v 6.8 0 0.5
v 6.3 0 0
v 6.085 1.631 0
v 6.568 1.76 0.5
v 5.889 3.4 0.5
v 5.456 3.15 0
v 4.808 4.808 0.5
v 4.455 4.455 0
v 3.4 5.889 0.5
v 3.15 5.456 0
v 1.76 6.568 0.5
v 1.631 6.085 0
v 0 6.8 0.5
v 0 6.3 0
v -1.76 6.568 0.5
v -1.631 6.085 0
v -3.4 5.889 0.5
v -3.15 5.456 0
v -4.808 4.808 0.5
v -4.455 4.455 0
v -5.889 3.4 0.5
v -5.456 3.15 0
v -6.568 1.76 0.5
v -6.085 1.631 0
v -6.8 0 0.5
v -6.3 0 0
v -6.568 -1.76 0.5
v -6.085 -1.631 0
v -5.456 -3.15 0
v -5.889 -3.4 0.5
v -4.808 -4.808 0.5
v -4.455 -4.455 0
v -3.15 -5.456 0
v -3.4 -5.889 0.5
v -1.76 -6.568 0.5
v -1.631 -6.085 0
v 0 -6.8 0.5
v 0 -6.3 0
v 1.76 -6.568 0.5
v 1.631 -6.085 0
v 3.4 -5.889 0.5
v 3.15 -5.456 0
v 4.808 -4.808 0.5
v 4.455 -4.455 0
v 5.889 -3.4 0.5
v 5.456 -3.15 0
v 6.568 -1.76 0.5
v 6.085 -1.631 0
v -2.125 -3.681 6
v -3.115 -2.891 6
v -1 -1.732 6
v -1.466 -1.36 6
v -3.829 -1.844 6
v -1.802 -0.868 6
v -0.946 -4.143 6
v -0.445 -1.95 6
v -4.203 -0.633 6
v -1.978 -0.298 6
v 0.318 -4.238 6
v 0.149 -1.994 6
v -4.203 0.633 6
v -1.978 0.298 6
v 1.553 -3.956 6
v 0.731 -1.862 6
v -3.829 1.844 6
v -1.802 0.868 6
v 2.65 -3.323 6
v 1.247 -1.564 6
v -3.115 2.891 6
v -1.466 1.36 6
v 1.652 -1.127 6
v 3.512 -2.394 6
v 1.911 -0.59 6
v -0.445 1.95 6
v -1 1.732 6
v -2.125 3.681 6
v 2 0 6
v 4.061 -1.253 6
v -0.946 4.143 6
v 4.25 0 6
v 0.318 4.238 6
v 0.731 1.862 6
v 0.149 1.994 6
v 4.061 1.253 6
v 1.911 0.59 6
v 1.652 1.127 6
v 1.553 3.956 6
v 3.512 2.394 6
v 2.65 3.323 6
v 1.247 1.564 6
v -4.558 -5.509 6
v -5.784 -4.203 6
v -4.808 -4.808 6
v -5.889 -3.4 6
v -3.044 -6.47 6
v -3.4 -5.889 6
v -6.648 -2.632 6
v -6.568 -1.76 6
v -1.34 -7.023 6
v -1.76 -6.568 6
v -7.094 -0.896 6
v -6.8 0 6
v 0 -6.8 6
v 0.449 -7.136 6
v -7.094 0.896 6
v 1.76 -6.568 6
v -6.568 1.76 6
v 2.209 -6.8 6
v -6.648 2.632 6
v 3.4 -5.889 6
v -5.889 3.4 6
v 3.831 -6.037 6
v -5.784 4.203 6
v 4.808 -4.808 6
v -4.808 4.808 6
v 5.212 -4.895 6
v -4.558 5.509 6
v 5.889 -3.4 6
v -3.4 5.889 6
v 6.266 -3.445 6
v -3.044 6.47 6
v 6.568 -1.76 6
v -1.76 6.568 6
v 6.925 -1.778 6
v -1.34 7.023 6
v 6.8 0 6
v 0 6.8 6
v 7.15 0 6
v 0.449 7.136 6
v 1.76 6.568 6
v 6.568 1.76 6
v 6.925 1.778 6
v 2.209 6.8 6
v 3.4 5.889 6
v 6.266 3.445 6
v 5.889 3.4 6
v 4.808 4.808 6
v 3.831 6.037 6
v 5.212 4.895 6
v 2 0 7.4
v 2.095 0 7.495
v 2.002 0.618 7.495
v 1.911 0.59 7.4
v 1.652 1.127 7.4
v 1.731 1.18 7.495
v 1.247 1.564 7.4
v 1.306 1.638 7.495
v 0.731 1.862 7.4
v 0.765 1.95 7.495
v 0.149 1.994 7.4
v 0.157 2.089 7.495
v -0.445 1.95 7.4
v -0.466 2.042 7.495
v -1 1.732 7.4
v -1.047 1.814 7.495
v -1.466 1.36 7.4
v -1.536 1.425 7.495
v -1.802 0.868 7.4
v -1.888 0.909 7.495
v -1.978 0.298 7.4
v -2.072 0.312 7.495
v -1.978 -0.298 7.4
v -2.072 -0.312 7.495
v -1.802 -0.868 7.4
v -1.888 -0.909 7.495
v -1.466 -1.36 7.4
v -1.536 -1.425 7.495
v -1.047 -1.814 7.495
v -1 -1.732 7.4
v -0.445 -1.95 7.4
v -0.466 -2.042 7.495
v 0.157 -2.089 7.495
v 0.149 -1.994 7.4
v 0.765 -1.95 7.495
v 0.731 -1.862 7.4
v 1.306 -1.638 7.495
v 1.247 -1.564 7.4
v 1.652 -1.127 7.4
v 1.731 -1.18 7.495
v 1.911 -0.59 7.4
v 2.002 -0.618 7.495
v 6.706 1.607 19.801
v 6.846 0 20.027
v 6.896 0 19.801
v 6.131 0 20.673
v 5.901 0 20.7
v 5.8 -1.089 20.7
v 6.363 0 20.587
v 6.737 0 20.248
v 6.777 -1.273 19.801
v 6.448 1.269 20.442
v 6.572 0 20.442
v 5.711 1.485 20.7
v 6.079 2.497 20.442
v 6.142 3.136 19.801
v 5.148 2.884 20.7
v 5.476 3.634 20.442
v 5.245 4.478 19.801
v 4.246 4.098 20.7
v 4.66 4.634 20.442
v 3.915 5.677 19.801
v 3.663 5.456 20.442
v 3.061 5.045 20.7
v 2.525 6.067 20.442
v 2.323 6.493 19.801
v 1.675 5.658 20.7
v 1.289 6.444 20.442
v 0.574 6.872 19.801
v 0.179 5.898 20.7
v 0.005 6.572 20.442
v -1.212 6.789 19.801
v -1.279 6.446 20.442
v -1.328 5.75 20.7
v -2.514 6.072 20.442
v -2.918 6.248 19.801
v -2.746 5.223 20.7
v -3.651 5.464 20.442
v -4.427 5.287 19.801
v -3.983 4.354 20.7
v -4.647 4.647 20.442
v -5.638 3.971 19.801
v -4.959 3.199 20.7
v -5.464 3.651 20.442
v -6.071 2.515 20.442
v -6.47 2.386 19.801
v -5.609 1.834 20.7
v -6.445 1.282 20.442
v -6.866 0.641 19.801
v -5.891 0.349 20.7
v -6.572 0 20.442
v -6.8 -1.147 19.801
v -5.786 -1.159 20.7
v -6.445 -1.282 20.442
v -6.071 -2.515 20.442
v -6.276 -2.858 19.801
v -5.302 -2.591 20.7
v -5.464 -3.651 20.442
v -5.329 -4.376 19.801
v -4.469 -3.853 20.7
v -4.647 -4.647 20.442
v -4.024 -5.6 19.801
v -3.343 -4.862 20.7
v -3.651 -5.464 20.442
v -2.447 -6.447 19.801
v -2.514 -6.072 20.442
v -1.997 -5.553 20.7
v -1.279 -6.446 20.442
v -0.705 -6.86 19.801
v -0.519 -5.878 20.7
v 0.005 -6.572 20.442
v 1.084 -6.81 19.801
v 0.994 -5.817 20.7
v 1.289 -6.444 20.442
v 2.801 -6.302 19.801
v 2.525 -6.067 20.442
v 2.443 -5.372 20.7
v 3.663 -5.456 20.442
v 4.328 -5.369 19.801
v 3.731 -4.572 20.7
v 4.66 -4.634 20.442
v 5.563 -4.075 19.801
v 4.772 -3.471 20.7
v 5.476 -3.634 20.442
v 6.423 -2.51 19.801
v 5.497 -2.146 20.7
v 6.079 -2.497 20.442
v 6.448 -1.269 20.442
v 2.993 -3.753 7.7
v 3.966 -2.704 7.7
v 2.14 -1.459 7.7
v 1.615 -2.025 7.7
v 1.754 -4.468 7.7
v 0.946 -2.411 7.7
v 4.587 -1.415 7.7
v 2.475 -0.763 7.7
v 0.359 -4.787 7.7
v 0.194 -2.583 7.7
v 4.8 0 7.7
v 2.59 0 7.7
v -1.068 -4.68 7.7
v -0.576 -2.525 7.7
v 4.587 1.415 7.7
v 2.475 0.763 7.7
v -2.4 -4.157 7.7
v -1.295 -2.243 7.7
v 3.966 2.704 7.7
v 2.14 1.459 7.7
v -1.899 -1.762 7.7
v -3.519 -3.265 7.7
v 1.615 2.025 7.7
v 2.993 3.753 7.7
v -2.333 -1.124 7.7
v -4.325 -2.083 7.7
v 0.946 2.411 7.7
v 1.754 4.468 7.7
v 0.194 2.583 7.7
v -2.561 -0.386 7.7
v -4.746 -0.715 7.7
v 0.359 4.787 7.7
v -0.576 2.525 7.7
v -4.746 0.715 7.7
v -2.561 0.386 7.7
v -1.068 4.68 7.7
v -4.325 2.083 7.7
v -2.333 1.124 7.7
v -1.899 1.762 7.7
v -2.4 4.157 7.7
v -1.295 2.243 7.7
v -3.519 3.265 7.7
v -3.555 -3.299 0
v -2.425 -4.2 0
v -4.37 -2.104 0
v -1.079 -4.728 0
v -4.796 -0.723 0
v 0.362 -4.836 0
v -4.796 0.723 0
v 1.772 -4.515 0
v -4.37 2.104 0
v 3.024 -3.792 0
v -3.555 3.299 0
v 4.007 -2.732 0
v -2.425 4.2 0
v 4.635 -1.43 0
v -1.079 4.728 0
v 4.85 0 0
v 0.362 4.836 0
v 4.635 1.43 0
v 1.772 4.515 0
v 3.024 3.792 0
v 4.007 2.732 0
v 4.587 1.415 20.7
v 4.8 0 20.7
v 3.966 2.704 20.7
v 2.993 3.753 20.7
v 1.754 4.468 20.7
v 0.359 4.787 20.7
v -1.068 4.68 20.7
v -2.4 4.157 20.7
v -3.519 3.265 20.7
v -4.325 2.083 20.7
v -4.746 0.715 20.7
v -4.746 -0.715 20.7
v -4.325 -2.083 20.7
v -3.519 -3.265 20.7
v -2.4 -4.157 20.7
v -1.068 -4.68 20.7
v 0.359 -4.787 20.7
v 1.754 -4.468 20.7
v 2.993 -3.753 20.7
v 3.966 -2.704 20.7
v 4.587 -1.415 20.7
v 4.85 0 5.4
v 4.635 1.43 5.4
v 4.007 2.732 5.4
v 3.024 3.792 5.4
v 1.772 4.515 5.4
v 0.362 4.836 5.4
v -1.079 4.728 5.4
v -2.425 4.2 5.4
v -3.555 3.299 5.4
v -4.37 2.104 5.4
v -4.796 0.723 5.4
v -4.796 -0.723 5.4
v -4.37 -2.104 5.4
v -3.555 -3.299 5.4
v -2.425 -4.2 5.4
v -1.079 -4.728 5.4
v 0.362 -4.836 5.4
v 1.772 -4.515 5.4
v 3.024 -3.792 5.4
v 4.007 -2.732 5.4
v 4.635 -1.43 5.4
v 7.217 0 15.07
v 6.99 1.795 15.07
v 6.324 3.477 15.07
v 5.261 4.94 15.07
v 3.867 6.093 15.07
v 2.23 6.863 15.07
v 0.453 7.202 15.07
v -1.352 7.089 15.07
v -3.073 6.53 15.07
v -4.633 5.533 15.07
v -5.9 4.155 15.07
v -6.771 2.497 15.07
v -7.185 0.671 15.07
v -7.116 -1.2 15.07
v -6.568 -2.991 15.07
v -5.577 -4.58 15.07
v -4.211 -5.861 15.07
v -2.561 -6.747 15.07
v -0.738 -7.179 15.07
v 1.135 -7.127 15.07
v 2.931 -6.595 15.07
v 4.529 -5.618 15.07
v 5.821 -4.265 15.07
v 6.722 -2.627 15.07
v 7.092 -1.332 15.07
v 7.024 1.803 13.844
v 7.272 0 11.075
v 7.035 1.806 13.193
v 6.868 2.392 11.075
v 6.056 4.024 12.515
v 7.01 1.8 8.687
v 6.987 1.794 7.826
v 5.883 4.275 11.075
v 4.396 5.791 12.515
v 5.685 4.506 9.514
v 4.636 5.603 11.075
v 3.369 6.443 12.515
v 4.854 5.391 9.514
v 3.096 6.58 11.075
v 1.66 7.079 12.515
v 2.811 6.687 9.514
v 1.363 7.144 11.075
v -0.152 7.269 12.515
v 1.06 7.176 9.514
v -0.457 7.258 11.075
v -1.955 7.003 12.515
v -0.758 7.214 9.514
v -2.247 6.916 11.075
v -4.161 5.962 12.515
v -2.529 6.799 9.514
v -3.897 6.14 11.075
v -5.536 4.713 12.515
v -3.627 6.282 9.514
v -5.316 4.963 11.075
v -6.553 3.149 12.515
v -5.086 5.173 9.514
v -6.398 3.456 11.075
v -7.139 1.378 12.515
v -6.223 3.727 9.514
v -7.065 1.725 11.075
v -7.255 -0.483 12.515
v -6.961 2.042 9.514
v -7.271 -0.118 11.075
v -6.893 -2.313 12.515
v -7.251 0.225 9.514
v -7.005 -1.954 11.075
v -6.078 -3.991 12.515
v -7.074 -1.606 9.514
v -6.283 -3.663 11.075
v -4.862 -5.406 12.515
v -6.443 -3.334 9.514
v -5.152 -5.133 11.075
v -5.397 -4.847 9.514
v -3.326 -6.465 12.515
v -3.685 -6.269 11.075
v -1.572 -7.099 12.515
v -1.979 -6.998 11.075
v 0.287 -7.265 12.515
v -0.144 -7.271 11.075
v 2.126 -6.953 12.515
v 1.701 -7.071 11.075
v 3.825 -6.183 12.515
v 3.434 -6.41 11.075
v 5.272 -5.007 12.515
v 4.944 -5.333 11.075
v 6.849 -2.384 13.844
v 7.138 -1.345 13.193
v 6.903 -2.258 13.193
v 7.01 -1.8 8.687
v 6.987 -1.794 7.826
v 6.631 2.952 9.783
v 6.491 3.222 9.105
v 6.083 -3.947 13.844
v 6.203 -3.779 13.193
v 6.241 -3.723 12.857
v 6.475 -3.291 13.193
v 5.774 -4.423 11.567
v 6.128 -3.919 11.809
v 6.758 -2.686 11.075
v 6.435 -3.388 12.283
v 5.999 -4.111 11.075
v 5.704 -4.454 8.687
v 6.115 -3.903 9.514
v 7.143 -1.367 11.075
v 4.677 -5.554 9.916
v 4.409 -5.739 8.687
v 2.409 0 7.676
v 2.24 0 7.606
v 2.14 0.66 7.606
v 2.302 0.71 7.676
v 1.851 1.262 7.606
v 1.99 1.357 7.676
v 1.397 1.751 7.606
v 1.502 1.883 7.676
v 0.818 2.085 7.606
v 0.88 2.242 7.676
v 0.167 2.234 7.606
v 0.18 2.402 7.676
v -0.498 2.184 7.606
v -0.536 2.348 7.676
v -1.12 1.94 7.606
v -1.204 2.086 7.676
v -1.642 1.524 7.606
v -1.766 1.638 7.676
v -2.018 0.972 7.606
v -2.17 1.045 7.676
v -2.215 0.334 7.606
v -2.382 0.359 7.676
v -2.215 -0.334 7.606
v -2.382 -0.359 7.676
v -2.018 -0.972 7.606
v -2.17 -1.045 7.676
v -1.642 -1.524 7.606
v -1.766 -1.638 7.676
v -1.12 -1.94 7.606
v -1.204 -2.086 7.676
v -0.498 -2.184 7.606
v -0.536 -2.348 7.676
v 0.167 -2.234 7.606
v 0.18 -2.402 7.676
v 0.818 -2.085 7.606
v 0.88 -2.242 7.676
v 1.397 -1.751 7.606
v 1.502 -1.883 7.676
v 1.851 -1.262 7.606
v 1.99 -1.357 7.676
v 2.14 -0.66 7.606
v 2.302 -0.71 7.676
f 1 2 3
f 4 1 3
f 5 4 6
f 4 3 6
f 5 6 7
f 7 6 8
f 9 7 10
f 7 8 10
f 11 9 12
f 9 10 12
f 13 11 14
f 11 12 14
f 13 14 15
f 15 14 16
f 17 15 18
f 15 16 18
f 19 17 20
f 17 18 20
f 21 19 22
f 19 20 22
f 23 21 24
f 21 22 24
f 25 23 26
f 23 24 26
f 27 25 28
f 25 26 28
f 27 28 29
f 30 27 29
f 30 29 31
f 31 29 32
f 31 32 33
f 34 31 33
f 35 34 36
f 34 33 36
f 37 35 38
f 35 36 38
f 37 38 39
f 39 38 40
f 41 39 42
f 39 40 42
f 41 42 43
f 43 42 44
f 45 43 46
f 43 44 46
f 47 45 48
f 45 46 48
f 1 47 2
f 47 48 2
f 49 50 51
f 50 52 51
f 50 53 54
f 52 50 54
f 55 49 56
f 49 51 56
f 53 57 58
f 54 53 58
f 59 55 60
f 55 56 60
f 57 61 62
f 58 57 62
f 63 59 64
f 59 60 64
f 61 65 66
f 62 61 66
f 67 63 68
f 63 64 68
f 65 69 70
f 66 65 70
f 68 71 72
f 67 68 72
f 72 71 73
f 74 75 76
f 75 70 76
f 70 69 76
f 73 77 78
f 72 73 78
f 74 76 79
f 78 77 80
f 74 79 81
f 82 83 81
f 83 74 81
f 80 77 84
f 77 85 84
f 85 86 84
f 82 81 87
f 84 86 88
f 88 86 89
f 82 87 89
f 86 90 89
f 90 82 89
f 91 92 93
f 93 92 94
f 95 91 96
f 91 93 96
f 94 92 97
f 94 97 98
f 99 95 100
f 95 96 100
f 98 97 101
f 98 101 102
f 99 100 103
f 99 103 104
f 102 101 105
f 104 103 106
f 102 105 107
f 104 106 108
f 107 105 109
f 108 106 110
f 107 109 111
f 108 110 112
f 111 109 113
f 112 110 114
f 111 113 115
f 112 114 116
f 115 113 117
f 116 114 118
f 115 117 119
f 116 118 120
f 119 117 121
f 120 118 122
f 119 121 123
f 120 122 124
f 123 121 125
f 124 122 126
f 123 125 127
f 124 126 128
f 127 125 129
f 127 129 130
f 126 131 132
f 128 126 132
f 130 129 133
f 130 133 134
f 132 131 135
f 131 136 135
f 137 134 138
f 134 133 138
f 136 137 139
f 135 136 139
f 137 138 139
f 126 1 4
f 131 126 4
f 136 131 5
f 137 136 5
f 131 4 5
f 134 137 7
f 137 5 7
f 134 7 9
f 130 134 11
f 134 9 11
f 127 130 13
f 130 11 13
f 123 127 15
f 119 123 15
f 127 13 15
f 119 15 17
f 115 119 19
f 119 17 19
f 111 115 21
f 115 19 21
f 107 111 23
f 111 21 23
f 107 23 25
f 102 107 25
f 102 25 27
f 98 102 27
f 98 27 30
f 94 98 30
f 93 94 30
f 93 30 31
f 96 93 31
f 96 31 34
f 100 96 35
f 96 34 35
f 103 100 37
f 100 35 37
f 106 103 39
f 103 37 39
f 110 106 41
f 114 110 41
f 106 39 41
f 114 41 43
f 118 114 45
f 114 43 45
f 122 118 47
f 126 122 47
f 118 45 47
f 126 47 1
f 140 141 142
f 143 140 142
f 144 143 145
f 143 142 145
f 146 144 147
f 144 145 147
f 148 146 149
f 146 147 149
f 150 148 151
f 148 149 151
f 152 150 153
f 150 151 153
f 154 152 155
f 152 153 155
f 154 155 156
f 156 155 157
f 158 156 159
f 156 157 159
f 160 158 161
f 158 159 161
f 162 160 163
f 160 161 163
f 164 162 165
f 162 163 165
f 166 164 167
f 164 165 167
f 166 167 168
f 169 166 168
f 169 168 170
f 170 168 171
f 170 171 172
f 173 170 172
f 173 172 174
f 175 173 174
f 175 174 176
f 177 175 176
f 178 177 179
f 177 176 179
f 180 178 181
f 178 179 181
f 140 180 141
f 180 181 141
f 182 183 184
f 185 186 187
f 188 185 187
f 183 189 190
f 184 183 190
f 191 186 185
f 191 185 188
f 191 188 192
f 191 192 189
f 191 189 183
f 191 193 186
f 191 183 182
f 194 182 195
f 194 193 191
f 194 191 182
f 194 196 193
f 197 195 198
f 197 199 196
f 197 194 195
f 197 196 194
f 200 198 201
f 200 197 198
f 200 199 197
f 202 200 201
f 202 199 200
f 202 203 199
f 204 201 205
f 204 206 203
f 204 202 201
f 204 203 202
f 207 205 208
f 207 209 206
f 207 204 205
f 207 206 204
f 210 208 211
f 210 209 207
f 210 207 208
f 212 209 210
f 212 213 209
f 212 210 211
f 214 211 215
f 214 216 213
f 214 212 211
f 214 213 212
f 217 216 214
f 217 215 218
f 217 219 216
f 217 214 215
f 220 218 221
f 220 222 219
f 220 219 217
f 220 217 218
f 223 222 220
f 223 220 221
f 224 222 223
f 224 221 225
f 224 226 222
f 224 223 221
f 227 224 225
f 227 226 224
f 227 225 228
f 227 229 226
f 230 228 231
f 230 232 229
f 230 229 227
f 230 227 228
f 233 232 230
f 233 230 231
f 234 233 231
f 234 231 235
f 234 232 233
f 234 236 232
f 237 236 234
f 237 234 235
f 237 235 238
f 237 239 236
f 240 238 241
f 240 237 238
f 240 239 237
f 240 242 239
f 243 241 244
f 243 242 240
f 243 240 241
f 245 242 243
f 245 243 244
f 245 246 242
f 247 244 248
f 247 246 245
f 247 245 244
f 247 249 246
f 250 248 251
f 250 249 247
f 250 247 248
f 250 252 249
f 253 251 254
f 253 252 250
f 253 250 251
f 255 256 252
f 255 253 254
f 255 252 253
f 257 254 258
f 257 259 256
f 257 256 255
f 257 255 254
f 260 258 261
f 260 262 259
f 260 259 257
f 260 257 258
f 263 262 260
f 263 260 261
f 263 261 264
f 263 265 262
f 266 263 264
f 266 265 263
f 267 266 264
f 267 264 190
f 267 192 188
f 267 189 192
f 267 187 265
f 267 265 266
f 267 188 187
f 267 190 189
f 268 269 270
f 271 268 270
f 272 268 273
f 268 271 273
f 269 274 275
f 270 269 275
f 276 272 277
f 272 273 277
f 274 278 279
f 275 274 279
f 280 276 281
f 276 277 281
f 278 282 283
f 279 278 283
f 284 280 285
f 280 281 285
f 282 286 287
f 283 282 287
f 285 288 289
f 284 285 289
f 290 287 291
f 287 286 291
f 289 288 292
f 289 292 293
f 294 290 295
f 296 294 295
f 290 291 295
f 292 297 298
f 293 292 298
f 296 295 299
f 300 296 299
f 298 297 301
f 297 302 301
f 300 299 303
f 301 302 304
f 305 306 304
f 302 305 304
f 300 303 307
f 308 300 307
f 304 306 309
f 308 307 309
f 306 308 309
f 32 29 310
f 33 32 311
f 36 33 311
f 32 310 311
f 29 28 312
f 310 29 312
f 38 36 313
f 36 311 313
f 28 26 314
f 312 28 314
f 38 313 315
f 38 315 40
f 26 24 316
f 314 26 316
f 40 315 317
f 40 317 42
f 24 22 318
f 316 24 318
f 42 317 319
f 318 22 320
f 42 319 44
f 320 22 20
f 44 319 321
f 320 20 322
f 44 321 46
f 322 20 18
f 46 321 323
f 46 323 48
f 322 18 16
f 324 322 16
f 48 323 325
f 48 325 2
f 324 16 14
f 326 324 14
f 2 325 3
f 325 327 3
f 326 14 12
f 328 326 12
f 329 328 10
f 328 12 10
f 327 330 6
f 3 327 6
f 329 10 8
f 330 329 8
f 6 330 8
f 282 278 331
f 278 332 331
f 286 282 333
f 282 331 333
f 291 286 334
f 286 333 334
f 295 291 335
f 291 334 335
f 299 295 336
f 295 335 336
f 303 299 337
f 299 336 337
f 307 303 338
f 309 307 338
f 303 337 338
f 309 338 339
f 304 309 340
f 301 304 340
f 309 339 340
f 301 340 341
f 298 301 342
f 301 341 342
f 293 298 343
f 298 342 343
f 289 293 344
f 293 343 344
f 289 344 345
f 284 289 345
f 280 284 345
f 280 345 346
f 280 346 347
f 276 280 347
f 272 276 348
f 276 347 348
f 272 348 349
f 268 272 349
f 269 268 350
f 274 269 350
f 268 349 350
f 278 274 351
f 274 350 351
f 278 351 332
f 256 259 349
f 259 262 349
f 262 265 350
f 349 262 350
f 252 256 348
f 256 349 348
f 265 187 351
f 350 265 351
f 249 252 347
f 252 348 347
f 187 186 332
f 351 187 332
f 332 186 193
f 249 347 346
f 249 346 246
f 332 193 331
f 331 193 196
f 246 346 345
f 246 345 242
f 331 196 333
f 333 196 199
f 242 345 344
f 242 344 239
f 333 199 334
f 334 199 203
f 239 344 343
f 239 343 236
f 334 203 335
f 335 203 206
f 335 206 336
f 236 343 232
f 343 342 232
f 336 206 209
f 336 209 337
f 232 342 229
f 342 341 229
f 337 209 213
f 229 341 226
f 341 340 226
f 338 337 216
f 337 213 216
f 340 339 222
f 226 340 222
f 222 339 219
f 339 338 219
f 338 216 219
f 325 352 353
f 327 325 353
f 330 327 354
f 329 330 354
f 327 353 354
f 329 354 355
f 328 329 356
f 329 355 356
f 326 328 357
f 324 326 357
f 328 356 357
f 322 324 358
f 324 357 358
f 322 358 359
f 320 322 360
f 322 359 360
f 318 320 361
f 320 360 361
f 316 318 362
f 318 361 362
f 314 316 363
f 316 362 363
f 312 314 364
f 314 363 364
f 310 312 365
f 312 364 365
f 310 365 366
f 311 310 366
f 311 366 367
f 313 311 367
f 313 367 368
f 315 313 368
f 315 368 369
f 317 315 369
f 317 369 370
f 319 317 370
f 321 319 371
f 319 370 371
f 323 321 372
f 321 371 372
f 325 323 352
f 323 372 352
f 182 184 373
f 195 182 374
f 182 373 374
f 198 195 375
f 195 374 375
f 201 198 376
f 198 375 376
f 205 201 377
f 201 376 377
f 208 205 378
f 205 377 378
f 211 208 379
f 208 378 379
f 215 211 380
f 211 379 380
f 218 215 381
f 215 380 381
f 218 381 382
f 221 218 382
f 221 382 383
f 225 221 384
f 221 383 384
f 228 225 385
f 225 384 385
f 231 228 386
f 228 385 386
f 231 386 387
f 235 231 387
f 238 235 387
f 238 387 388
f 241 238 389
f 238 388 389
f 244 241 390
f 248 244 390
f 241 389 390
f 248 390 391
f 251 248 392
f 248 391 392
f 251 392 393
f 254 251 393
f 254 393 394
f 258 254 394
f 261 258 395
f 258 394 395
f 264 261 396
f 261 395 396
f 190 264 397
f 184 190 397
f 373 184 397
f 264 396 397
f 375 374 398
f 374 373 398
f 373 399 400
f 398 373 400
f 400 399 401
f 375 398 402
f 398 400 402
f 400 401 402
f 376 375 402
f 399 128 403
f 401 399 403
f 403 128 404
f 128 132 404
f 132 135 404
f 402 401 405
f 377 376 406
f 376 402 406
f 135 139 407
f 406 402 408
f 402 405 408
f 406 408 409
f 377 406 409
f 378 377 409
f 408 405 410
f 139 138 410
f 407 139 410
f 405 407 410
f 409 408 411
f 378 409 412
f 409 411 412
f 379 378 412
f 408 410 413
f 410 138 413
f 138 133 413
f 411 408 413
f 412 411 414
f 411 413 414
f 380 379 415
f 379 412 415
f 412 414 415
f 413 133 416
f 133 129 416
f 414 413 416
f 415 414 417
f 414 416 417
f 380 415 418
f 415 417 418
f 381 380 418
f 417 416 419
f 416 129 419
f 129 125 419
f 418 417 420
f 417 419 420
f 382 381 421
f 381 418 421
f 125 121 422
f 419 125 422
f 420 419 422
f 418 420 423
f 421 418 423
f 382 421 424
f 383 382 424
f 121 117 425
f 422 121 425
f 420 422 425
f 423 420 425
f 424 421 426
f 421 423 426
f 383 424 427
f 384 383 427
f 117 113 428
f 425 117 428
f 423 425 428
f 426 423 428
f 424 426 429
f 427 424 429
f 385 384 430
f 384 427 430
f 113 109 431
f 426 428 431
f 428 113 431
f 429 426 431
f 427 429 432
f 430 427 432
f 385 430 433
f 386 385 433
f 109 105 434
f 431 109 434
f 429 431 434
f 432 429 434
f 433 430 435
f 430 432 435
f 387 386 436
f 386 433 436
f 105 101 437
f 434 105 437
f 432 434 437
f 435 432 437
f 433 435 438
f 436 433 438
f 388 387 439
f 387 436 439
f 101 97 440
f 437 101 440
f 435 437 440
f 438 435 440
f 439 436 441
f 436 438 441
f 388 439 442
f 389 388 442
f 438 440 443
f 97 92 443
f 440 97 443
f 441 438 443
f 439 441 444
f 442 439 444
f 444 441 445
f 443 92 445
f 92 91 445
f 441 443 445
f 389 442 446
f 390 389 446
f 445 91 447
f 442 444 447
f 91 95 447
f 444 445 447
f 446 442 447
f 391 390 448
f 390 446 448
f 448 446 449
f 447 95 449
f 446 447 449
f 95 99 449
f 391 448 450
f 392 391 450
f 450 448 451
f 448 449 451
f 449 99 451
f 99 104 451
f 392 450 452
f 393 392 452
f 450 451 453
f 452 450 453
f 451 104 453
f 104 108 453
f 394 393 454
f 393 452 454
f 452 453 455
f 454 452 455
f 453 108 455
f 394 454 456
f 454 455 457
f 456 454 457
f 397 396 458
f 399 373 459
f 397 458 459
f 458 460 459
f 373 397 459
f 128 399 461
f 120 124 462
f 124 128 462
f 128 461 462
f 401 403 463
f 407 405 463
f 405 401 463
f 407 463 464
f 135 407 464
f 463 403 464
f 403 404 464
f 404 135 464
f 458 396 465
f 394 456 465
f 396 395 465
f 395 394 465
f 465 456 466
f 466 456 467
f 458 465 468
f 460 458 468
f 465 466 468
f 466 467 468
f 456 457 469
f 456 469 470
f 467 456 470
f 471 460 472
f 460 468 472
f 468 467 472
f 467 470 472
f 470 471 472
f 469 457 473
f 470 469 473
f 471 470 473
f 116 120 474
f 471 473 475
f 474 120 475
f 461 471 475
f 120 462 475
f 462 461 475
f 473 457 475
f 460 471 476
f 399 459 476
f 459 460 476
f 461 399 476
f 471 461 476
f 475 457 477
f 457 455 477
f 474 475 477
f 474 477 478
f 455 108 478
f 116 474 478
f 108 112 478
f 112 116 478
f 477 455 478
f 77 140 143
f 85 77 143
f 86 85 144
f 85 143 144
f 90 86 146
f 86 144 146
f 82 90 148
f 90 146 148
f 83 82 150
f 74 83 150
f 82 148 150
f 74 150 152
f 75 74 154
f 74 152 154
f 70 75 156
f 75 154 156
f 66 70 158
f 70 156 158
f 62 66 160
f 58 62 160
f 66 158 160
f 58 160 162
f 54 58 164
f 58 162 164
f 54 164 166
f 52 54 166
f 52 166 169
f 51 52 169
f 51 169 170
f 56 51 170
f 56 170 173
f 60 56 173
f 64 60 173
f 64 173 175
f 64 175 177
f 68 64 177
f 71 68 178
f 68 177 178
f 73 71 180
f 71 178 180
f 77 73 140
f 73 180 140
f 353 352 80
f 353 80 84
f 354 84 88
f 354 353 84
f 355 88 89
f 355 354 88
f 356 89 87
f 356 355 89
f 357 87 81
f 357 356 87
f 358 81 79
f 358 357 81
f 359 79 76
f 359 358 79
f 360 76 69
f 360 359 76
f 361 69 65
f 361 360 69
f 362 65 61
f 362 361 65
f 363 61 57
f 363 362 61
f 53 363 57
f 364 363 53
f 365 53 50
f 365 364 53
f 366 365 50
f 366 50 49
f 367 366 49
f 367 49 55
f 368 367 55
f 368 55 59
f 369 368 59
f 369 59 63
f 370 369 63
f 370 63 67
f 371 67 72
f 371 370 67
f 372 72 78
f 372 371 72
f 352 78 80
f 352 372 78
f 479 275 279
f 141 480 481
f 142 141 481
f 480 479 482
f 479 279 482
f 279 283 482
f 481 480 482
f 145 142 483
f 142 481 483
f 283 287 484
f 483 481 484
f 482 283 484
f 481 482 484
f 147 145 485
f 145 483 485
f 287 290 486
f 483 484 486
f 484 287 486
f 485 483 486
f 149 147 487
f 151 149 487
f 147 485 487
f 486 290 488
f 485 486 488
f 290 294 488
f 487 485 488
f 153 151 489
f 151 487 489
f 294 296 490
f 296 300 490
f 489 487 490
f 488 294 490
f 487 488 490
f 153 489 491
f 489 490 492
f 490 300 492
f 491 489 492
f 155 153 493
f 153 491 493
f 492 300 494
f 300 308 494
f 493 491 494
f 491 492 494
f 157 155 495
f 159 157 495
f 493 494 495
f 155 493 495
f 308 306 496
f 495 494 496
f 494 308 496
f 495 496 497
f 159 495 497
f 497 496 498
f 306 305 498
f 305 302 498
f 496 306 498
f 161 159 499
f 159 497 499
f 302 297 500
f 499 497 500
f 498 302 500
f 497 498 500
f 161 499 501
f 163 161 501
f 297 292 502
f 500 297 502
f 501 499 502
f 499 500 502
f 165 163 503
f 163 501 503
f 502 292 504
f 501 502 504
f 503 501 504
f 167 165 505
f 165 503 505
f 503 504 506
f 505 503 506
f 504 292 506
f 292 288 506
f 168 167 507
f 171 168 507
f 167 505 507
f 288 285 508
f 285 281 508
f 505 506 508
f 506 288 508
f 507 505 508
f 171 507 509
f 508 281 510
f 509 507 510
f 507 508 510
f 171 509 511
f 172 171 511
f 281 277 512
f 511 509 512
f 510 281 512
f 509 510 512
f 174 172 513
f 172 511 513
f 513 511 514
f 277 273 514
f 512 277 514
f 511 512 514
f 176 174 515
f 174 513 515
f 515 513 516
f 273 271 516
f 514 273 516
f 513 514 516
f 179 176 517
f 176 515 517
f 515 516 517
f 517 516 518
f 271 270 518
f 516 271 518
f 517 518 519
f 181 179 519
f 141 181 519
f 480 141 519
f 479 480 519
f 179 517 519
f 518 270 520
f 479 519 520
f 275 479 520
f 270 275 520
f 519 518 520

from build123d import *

# Parameters (mm, degrees)
CHAMFER001_SIZE = 0.3
FILLET_R        = 1
CHAMFER_SIZE    = 0.5
FILLET001_R     = 0.7
CHAMFER002_SIZE = 0.6


with BuildPart() as part:
    # Sketch → Revolution (revolve)
    with BuildSketch(Plane.XZ):
        with BuildLine():
            Line((4.85, 0), (4.85, 6))
            Line((4.85, 6), (2, 6))
            Line((2, 6), (2, 7.7))
            Line((2, 7.7), (4.8, 7.7))
            Line((4.8, 7.7), (4.8, 20.7))
            Line((4.8, 20.7), (6.8, 20.7))
            add(Edge.make_bspline(
                [(6.8, 20.7), (7.143442, 17.628334), (7.454755, 13.542369), (7.15, 6)],
                knots=[0, 0, 0, 0, 1, 1, 1, 1], degree=3))
            Line((7.15, 6), (6.8, 6))
            Line((6.8, 6), (6.8, 0))
            Line((6.8, 0), (4.85, 0))
        make_face()
    revolve(axis=Axis((0, 0, 0), (0, 0, 1)))

    # Chamfer001
    chamfer001_edges = [part.edges().sort_by_distance(p)[0] for p in [
        (-2, 0, 7.7),
    ]]
    chamfer(chamfer001_edges, length=CHAMFER001_SIZE)

    # Fillet
    fillet_edges = [part.edges().sort_by_distance(p)[0] for p in [
        (-6.8, 0, 20.7),
    ]]
    fillet(fillet_edges, radius=FILLET_R)

    # Chamfer
    chamfer_edges = [part.edges().sort_by_distance(p)[0] for p in [
        (-6.8, 0, 0),
    ]]
    chamfer(chamfer_edges, length=CHAMFER_SIZE)

    # Fillet001
    fillet001_edges = [part.edges().sort_by_distance(p)[0] for p in [
        (-2.3, 0, 7.7),
    ]]
    fillet(fillet001_edges, radius=FILLET001_R)

    # Chamfer002
    chamfer002_edges = [part.edges().sort_by_distance(p)[0] for p in [
        (-4.85, 0, 6),
    ]]
    chamfer(chamfer002_edges, length=CHAMFER002_SIZE)


solid = part.part
